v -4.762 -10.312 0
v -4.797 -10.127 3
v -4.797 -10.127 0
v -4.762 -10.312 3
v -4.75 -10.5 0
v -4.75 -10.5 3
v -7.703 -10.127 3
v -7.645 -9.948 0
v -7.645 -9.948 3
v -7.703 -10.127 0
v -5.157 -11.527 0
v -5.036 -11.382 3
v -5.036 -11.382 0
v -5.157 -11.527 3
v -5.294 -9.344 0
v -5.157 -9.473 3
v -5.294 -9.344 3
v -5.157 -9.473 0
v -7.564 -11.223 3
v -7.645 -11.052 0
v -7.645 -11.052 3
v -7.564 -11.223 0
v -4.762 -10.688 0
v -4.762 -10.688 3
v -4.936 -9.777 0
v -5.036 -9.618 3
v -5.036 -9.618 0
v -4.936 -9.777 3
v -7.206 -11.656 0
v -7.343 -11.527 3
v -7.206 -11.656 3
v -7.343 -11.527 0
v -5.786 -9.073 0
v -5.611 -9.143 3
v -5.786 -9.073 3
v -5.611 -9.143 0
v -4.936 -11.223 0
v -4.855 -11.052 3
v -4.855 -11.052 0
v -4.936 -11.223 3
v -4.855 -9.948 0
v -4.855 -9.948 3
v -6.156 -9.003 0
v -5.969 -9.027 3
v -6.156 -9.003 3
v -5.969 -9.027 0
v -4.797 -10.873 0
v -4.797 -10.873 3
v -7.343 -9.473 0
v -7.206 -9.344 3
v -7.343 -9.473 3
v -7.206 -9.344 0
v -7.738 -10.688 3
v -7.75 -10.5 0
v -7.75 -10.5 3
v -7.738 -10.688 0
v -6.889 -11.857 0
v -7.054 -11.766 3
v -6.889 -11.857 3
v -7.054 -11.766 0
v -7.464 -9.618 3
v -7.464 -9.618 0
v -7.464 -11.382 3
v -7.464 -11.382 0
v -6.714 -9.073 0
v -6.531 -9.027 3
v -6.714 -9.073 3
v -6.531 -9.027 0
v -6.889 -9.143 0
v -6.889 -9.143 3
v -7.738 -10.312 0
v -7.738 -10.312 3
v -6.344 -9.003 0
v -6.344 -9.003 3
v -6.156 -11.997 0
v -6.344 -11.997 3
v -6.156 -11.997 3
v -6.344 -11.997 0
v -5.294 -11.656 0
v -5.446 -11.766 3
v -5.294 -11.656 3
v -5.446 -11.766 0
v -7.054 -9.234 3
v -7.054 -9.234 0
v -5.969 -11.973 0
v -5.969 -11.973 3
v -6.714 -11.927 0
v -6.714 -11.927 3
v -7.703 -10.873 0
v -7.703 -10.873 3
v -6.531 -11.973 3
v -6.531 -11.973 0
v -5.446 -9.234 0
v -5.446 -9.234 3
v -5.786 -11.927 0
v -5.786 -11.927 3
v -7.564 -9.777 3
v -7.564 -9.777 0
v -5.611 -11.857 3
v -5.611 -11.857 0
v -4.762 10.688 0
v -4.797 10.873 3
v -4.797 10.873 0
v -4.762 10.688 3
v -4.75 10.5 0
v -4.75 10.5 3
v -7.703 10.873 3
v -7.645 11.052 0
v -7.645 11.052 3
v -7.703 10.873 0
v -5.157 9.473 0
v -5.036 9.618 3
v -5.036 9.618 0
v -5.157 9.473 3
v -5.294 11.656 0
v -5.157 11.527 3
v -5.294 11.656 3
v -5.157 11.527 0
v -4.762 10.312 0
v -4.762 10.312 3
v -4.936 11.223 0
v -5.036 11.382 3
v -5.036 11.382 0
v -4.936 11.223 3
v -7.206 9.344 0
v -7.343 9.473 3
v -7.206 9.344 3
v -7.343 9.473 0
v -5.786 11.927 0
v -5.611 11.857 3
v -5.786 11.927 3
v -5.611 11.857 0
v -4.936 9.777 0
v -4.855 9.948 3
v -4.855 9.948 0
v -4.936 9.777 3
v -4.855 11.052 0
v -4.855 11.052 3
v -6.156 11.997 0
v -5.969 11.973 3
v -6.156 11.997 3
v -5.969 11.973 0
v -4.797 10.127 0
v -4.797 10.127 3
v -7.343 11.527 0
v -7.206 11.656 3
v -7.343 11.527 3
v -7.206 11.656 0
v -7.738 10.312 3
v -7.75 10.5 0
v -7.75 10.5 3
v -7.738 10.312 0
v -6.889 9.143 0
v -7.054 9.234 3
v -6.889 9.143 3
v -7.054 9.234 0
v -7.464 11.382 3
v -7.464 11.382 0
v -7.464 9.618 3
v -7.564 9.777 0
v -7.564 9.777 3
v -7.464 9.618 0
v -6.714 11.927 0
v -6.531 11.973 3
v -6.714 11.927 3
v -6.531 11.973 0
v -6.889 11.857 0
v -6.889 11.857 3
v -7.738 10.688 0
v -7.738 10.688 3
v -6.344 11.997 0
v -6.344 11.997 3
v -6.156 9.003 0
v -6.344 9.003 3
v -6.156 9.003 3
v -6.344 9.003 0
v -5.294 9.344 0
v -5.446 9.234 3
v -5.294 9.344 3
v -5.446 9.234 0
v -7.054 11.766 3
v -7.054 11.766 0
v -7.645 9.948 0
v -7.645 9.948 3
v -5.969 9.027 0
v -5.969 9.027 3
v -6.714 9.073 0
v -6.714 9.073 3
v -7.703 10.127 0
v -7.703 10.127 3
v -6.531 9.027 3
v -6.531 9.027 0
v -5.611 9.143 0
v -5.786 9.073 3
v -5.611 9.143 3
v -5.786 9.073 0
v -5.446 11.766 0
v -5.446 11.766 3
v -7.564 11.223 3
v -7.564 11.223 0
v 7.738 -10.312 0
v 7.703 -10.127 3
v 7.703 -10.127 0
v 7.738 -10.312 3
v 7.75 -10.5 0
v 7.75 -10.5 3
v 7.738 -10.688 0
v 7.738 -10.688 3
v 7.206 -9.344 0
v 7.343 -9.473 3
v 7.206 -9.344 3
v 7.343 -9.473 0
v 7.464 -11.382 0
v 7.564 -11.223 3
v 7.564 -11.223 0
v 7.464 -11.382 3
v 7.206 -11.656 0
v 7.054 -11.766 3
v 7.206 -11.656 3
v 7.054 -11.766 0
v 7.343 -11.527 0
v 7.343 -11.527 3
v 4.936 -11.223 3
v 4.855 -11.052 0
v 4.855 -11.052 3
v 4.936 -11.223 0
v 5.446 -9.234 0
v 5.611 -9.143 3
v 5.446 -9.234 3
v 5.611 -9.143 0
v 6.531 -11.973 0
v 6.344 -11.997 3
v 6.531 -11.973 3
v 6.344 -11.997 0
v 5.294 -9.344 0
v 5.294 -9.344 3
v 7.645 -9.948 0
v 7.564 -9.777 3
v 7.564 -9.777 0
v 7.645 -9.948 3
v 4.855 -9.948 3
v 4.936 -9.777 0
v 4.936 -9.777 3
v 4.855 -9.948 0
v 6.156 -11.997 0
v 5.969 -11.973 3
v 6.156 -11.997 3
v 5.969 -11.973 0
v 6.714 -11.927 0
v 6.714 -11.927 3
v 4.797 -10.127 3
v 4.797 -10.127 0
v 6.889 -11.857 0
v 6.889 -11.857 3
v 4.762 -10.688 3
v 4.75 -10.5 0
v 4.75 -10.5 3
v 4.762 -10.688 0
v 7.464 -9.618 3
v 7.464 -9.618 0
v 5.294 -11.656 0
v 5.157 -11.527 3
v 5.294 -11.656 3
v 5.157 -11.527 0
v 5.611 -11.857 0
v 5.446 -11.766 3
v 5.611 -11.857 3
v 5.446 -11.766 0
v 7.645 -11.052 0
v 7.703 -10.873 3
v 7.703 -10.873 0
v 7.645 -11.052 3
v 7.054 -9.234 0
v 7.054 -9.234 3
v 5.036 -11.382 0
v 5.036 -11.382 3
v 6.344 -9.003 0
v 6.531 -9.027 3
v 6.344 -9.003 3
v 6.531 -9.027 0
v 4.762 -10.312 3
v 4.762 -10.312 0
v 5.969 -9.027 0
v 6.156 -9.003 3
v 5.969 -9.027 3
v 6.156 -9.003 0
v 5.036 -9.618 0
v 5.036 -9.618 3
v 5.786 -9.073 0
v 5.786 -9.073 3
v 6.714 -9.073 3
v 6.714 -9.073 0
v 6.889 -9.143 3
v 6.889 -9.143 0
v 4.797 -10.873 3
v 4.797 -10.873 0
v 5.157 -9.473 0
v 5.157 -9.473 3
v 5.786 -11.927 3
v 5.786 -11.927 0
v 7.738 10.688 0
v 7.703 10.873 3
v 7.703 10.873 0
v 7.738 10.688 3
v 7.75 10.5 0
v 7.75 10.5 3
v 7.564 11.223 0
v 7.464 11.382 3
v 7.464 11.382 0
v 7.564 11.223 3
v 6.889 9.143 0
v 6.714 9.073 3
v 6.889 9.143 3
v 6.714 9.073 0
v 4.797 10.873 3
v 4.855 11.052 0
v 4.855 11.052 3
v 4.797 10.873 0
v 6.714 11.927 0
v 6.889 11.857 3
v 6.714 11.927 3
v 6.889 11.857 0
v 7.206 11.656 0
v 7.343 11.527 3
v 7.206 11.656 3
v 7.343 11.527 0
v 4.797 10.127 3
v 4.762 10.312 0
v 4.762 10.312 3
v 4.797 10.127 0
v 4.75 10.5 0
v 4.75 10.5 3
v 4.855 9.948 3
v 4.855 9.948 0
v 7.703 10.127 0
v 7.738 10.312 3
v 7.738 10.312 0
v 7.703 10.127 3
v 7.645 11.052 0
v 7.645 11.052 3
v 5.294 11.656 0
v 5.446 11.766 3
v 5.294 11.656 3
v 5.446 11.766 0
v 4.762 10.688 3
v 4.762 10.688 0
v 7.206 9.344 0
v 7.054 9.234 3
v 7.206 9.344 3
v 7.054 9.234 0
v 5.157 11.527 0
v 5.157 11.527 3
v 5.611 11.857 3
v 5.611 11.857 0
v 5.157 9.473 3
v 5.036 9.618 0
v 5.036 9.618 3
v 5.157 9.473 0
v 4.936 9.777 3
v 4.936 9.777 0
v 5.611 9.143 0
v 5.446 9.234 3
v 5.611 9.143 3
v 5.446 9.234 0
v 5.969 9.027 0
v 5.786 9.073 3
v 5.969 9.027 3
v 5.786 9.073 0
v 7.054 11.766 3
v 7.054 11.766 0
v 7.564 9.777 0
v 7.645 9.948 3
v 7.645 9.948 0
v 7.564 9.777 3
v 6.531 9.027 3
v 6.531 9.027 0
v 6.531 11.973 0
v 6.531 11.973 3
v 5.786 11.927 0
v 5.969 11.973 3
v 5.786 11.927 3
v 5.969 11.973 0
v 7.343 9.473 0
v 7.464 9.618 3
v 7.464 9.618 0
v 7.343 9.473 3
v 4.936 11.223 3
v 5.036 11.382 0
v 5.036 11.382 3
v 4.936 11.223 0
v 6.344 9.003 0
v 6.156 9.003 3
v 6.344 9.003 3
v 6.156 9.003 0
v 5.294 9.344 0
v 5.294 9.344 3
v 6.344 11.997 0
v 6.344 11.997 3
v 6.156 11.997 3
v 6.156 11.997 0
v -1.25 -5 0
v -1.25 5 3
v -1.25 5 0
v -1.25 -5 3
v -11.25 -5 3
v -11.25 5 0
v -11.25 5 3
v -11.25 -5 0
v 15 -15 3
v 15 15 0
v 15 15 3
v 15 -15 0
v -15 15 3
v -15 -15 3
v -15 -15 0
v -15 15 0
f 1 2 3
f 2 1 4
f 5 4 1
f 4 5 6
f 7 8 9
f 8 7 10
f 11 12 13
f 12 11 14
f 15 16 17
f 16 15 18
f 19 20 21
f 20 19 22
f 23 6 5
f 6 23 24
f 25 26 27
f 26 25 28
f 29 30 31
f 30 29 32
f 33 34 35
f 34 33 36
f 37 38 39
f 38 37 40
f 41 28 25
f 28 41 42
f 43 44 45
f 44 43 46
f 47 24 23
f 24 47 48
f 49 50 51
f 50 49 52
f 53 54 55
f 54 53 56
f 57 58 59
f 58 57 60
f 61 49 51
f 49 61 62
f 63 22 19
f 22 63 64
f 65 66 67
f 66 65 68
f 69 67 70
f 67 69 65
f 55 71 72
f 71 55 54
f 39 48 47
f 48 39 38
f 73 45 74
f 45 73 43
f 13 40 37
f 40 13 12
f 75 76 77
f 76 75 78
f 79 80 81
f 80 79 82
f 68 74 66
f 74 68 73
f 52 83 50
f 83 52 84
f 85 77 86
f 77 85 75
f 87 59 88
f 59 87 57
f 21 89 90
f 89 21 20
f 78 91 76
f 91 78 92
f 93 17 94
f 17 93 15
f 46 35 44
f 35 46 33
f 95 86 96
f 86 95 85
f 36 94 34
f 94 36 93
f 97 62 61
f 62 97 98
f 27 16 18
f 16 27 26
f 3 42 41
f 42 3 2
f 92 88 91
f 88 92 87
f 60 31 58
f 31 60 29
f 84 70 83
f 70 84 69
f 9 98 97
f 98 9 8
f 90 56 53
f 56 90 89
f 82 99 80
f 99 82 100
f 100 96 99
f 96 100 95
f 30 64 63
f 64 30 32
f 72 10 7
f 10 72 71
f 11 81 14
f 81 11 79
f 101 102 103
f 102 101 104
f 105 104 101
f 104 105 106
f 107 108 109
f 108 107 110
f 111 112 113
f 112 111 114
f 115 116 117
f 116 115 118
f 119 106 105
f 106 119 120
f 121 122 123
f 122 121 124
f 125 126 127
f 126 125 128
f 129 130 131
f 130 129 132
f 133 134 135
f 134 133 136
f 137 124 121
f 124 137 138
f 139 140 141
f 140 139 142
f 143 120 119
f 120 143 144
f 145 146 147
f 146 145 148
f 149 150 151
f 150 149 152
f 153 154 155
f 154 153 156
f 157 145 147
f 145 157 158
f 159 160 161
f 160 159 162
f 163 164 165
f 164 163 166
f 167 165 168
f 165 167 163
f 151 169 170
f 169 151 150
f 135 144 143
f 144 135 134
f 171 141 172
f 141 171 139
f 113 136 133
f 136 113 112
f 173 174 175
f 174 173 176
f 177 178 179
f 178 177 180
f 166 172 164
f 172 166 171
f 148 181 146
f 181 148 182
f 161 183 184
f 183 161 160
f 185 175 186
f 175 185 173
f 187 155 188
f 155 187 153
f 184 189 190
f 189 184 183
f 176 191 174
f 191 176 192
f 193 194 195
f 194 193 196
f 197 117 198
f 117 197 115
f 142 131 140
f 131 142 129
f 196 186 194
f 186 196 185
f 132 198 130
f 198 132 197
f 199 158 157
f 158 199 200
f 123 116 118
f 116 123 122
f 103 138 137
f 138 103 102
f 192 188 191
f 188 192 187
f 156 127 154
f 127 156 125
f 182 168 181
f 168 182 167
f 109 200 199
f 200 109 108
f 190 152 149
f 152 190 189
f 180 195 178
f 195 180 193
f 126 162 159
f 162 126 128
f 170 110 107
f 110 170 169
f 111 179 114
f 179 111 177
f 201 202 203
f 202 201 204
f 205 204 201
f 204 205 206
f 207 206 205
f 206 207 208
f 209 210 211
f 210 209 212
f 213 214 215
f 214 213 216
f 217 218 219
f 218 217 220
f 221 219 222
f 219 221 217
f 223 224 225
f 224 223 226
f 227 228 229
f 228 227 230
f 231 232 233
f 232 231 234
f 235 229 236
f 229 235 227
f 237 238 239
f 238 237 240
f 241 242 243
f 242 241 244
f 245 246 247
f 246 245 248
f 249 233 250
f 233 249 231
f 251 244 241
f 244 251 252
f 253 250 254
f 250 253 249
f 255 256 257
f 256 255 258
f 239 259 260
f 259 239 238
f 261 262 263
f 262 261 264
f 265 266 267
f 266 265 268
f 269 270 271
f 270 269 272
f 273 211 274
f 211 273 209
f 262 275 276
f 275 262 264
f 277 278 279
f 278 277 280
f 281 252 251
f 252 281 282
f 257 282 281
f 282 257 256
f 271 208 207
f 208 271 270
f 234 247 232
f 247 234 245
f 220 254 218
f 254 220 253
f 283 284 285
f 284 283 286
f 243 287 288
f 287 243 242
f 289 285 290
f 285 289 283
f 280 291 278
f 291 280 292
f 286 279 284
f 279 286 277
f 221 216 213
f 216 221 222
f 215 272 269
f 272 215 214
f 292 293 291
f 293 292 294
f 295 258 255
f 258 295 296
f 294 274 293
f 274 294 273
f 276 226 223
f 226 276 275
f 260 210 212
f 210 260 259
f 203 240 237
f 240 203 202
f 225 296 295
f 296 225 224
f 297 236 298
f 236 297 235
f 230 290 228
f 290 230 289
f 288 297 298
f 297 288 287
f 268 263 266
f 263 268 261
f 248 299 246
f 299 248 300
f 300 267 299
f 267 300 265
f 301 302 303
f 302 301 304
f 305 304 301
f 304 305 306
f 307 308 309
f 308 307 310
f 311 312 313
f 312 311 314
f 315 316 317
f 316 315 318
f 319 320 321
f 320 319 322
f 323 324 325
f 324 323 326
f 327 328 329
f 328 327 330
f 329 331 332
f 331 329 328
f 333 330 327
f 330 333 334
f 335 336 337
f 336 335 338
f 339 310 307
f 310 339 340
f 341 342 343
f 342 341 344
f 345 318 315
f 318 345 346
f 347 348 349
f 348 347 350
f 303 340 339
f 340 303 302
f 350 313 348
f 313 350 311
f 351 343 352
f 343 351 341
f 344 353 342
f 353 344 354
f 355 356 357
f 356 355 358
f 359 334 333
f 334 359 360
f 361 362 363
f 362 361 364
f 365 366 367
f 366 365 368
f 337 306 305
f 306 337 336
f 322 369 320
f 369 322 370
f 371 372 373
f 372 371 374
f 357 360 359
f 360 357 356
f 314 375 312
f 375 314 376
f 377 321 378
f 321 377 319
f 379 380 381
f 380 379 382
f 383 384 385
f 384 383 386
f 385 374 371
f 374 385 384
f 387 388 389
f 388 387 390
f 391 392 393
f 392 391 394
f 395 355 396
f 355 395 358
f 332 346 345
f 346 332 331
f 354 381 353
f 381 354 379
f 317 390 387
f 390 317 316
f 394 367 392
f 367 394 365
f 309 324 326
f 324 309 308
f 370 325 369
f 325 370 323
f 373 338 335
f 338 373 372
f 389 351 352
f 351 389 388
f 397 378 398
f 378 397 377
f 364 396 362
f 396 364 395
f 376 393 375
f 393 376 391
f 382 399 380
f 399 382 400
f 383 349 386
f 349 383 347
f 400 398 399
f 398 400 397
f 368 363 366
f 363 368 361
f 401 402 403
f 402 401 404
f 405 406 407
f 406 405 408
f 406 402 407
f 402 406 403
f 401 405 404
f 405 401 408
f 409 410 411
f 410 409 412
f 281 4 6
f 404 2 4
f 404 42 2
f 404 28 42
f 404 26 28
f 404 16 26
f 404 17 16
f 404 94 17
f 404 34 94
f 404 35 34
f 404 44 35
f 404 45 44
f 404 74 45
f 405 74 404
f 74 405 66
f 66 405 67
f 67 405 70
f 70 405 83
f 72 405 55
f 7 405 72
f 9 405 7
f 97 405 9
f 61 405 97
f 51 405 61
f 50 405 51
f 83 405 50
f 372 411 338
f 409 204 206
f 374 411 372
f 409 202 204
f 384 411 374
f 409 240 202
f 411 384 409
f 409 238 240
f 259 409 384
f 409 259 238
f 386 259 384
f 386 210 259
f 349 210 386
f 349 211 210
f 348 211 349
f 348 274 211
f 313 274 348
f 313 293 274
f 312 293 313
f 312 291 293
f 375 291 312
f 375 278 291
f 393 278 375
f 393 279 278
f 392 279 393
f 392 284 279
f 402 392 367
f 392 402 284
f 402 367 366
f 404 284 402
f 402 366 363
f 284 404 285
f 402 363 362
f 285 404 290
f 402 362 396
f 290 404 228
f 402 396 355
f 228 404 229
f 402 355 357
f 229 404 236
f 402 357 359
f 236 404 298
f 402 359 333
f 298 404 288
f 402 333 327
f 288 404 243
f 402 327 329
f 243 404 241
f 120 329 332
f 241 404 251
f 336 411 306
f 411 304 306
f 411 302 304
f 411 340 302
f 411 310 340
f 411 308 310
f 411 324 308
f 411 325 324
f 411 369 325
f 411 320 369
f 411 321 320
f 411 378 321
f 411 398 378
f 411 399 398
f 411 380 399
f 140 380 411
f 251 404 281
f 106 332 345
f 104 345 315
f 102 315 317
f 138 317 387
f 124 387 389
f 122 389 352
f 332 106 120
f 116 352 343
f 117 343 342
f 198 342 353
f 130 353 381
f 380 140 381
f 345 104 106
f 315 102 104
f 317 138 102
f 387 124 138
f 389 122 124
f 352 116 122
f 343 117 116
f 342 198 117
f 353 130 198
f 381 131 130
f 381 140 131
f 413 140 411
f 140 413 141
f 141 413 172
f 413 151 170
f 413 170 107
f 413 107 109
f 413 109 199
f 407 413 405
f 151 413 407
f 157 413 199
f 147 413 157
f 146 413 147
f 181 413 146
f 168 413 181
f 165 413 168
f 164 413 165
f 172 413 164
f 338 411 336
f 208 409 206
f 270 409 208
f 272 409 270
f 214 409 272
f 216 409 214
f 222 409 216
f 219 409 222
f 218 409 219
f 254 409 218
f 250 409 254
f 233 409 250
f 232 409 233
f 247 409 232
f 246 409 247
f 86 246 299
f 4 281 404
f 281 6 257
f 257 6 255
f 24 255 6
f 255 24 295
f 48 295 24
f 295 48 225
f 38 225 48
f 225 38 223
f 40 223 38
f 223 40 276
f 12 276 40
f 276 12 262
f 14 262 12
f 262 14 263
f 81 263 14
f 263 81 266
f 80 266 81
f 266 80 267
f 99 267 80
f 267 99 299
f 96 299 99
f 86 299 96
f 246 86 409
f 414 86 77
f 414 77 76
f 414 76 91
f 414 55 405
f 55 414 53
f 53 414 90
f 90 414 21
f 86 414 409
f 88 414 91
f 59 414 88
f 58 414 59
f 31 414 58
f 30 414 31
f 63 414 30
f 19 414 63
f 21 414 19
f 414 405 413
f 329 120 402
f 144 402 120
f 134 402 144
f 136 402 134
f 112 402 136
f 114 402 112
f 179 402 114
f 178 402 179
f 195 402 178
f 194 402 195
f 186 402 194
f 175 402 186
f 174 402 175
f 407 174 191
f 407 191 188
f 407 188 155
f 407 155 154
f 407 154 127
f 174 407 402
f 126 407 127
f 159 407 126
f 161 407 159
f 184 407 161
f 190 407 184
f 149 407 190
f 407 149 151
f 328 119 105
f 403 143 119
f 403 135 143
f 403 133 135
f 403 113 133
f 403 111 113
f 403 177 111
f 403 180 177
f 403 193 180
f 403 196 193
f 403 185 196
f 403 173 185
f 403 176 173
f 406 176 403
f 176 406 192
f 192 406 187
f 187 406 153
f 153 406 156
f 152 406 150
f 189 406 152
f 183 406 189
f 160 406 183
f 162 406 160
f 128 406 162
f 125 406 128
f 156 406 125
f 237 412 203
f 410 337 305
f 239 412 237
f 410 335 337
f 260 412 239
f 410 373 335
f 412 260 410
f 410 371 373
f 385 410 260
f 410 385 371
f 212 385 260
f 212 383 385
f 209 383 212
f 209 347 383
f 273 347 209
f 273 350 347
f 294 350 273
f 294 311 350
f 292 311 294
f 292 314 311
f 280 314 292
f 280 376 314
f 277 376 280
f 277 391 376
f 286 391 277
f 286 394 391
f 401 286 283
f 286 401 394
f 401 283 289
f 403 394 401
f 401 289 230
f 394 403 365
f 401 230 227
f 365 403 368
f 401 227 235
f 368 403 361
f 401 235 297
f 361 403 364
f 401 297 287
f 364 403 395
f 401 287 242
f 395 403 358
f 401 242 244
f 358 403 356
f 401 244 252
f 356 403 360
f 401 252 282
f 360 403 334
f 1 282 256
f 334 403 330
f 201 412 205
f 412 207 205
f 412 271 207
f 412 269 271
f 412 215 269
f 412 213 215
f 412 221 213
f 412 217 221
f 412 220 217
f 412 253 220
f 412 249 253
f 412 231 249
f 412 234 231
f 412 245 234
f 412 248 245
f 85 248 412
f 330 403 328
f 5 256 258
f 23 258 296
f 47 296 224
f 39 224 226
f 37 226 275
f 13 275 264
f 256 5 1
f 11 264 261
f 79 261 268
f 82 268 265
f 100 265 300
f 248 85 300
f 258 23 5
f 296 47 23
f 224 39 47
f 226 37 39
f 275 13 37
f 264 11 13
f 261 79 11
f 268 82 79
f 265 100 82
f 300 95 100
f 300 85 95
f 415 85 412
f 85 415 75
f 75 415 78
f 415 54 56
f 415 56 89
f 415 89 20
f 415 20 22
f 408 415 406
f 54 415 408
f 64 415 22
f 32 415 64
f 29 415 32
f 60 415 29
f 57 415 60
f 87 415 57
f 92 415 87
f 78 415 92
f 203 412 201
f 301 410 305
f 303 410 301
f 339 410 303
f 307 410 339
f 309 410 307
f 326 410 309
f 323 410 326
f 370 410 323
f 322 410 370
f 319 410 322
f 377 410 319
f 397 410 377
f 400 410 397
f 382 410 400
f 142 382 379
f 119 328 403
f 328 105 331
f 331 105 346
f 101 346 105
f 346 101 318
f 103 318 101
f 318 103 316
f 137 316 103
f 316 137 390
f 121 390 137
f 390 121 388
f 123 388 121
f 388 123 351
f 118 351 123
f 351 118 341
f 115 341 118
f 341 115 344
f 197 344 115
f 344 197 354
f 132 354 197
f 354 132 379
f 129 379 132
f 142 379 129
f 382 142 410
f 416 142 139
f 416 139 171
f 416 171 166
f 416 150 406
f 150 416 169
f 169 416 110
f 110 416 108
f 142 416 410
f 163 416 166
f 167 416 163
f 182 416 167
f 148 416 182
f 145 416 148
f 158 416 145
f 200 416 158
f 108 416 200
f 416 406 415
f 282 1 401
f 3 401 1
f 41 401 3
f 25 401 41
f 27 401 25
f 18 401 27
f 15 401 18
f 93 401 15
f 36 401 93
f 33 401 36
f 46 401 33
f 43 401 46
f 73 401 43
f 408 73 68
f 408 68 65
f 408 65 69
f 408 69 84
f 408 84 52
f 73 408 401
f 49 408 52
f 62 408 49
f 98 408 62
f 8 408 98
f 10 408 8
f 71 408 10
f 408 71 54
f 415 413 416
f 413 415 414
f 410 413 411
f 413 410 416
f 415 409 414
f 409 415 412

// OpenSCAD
// Raspicam for Pibow (model B)
// A raspicam support for the Pibow case (Pimoroni).

// Copyright (c) 2014 Jérémie DECOCK <jd.jdhp@gmail.com>


// RASPICAM FRONT ///////////////////////////

module raspicam_front(board_height) {

    // Local const
    screw_radius = 1.5;
    screw_spacing_x = 12.5;
    screw_spacing_y = 21;
    camera_slot_width = 10;

    // Four screw holes
    for (i = [-1, 1]) {    
        for (j = [-1, 1]) {    
            translate([i*screw_spacing_x/2, j*screw_spacing_y/2, 0]) {        
                cylinder(r=screw_radius, h=board_height+1, center=true, $fn=50);
            }
        }
    }

    // Camera slot
    translate([-screw_spacing_x/2, 0, 0]){
        cube([camera_slot_width, camera_slot_width, board_height+1], center=true);
    }

}

// TEST /////////////////////////////////////

raspicam_front_width=30;  // x
raspicam_front_depth=30;  // y
raspicam_front_height=3;  // z

// Check vars
if(raspicam_front_width < 16.5) echo("WARNING: board_width should be greater than or equal to 98");
if(raspicam_front_depth < 25)   echo("WARNING: board_depth should be greater than or equal to 65.5");

translate([0, 0, raspicam_front_height/2]) {
    difference() {
        cube([raspicam_front_width, raspicam_front_depth, raspicam_front_height], center=true);
        #raspicam_front(board_height=raspicam_front_height);
    }
}
